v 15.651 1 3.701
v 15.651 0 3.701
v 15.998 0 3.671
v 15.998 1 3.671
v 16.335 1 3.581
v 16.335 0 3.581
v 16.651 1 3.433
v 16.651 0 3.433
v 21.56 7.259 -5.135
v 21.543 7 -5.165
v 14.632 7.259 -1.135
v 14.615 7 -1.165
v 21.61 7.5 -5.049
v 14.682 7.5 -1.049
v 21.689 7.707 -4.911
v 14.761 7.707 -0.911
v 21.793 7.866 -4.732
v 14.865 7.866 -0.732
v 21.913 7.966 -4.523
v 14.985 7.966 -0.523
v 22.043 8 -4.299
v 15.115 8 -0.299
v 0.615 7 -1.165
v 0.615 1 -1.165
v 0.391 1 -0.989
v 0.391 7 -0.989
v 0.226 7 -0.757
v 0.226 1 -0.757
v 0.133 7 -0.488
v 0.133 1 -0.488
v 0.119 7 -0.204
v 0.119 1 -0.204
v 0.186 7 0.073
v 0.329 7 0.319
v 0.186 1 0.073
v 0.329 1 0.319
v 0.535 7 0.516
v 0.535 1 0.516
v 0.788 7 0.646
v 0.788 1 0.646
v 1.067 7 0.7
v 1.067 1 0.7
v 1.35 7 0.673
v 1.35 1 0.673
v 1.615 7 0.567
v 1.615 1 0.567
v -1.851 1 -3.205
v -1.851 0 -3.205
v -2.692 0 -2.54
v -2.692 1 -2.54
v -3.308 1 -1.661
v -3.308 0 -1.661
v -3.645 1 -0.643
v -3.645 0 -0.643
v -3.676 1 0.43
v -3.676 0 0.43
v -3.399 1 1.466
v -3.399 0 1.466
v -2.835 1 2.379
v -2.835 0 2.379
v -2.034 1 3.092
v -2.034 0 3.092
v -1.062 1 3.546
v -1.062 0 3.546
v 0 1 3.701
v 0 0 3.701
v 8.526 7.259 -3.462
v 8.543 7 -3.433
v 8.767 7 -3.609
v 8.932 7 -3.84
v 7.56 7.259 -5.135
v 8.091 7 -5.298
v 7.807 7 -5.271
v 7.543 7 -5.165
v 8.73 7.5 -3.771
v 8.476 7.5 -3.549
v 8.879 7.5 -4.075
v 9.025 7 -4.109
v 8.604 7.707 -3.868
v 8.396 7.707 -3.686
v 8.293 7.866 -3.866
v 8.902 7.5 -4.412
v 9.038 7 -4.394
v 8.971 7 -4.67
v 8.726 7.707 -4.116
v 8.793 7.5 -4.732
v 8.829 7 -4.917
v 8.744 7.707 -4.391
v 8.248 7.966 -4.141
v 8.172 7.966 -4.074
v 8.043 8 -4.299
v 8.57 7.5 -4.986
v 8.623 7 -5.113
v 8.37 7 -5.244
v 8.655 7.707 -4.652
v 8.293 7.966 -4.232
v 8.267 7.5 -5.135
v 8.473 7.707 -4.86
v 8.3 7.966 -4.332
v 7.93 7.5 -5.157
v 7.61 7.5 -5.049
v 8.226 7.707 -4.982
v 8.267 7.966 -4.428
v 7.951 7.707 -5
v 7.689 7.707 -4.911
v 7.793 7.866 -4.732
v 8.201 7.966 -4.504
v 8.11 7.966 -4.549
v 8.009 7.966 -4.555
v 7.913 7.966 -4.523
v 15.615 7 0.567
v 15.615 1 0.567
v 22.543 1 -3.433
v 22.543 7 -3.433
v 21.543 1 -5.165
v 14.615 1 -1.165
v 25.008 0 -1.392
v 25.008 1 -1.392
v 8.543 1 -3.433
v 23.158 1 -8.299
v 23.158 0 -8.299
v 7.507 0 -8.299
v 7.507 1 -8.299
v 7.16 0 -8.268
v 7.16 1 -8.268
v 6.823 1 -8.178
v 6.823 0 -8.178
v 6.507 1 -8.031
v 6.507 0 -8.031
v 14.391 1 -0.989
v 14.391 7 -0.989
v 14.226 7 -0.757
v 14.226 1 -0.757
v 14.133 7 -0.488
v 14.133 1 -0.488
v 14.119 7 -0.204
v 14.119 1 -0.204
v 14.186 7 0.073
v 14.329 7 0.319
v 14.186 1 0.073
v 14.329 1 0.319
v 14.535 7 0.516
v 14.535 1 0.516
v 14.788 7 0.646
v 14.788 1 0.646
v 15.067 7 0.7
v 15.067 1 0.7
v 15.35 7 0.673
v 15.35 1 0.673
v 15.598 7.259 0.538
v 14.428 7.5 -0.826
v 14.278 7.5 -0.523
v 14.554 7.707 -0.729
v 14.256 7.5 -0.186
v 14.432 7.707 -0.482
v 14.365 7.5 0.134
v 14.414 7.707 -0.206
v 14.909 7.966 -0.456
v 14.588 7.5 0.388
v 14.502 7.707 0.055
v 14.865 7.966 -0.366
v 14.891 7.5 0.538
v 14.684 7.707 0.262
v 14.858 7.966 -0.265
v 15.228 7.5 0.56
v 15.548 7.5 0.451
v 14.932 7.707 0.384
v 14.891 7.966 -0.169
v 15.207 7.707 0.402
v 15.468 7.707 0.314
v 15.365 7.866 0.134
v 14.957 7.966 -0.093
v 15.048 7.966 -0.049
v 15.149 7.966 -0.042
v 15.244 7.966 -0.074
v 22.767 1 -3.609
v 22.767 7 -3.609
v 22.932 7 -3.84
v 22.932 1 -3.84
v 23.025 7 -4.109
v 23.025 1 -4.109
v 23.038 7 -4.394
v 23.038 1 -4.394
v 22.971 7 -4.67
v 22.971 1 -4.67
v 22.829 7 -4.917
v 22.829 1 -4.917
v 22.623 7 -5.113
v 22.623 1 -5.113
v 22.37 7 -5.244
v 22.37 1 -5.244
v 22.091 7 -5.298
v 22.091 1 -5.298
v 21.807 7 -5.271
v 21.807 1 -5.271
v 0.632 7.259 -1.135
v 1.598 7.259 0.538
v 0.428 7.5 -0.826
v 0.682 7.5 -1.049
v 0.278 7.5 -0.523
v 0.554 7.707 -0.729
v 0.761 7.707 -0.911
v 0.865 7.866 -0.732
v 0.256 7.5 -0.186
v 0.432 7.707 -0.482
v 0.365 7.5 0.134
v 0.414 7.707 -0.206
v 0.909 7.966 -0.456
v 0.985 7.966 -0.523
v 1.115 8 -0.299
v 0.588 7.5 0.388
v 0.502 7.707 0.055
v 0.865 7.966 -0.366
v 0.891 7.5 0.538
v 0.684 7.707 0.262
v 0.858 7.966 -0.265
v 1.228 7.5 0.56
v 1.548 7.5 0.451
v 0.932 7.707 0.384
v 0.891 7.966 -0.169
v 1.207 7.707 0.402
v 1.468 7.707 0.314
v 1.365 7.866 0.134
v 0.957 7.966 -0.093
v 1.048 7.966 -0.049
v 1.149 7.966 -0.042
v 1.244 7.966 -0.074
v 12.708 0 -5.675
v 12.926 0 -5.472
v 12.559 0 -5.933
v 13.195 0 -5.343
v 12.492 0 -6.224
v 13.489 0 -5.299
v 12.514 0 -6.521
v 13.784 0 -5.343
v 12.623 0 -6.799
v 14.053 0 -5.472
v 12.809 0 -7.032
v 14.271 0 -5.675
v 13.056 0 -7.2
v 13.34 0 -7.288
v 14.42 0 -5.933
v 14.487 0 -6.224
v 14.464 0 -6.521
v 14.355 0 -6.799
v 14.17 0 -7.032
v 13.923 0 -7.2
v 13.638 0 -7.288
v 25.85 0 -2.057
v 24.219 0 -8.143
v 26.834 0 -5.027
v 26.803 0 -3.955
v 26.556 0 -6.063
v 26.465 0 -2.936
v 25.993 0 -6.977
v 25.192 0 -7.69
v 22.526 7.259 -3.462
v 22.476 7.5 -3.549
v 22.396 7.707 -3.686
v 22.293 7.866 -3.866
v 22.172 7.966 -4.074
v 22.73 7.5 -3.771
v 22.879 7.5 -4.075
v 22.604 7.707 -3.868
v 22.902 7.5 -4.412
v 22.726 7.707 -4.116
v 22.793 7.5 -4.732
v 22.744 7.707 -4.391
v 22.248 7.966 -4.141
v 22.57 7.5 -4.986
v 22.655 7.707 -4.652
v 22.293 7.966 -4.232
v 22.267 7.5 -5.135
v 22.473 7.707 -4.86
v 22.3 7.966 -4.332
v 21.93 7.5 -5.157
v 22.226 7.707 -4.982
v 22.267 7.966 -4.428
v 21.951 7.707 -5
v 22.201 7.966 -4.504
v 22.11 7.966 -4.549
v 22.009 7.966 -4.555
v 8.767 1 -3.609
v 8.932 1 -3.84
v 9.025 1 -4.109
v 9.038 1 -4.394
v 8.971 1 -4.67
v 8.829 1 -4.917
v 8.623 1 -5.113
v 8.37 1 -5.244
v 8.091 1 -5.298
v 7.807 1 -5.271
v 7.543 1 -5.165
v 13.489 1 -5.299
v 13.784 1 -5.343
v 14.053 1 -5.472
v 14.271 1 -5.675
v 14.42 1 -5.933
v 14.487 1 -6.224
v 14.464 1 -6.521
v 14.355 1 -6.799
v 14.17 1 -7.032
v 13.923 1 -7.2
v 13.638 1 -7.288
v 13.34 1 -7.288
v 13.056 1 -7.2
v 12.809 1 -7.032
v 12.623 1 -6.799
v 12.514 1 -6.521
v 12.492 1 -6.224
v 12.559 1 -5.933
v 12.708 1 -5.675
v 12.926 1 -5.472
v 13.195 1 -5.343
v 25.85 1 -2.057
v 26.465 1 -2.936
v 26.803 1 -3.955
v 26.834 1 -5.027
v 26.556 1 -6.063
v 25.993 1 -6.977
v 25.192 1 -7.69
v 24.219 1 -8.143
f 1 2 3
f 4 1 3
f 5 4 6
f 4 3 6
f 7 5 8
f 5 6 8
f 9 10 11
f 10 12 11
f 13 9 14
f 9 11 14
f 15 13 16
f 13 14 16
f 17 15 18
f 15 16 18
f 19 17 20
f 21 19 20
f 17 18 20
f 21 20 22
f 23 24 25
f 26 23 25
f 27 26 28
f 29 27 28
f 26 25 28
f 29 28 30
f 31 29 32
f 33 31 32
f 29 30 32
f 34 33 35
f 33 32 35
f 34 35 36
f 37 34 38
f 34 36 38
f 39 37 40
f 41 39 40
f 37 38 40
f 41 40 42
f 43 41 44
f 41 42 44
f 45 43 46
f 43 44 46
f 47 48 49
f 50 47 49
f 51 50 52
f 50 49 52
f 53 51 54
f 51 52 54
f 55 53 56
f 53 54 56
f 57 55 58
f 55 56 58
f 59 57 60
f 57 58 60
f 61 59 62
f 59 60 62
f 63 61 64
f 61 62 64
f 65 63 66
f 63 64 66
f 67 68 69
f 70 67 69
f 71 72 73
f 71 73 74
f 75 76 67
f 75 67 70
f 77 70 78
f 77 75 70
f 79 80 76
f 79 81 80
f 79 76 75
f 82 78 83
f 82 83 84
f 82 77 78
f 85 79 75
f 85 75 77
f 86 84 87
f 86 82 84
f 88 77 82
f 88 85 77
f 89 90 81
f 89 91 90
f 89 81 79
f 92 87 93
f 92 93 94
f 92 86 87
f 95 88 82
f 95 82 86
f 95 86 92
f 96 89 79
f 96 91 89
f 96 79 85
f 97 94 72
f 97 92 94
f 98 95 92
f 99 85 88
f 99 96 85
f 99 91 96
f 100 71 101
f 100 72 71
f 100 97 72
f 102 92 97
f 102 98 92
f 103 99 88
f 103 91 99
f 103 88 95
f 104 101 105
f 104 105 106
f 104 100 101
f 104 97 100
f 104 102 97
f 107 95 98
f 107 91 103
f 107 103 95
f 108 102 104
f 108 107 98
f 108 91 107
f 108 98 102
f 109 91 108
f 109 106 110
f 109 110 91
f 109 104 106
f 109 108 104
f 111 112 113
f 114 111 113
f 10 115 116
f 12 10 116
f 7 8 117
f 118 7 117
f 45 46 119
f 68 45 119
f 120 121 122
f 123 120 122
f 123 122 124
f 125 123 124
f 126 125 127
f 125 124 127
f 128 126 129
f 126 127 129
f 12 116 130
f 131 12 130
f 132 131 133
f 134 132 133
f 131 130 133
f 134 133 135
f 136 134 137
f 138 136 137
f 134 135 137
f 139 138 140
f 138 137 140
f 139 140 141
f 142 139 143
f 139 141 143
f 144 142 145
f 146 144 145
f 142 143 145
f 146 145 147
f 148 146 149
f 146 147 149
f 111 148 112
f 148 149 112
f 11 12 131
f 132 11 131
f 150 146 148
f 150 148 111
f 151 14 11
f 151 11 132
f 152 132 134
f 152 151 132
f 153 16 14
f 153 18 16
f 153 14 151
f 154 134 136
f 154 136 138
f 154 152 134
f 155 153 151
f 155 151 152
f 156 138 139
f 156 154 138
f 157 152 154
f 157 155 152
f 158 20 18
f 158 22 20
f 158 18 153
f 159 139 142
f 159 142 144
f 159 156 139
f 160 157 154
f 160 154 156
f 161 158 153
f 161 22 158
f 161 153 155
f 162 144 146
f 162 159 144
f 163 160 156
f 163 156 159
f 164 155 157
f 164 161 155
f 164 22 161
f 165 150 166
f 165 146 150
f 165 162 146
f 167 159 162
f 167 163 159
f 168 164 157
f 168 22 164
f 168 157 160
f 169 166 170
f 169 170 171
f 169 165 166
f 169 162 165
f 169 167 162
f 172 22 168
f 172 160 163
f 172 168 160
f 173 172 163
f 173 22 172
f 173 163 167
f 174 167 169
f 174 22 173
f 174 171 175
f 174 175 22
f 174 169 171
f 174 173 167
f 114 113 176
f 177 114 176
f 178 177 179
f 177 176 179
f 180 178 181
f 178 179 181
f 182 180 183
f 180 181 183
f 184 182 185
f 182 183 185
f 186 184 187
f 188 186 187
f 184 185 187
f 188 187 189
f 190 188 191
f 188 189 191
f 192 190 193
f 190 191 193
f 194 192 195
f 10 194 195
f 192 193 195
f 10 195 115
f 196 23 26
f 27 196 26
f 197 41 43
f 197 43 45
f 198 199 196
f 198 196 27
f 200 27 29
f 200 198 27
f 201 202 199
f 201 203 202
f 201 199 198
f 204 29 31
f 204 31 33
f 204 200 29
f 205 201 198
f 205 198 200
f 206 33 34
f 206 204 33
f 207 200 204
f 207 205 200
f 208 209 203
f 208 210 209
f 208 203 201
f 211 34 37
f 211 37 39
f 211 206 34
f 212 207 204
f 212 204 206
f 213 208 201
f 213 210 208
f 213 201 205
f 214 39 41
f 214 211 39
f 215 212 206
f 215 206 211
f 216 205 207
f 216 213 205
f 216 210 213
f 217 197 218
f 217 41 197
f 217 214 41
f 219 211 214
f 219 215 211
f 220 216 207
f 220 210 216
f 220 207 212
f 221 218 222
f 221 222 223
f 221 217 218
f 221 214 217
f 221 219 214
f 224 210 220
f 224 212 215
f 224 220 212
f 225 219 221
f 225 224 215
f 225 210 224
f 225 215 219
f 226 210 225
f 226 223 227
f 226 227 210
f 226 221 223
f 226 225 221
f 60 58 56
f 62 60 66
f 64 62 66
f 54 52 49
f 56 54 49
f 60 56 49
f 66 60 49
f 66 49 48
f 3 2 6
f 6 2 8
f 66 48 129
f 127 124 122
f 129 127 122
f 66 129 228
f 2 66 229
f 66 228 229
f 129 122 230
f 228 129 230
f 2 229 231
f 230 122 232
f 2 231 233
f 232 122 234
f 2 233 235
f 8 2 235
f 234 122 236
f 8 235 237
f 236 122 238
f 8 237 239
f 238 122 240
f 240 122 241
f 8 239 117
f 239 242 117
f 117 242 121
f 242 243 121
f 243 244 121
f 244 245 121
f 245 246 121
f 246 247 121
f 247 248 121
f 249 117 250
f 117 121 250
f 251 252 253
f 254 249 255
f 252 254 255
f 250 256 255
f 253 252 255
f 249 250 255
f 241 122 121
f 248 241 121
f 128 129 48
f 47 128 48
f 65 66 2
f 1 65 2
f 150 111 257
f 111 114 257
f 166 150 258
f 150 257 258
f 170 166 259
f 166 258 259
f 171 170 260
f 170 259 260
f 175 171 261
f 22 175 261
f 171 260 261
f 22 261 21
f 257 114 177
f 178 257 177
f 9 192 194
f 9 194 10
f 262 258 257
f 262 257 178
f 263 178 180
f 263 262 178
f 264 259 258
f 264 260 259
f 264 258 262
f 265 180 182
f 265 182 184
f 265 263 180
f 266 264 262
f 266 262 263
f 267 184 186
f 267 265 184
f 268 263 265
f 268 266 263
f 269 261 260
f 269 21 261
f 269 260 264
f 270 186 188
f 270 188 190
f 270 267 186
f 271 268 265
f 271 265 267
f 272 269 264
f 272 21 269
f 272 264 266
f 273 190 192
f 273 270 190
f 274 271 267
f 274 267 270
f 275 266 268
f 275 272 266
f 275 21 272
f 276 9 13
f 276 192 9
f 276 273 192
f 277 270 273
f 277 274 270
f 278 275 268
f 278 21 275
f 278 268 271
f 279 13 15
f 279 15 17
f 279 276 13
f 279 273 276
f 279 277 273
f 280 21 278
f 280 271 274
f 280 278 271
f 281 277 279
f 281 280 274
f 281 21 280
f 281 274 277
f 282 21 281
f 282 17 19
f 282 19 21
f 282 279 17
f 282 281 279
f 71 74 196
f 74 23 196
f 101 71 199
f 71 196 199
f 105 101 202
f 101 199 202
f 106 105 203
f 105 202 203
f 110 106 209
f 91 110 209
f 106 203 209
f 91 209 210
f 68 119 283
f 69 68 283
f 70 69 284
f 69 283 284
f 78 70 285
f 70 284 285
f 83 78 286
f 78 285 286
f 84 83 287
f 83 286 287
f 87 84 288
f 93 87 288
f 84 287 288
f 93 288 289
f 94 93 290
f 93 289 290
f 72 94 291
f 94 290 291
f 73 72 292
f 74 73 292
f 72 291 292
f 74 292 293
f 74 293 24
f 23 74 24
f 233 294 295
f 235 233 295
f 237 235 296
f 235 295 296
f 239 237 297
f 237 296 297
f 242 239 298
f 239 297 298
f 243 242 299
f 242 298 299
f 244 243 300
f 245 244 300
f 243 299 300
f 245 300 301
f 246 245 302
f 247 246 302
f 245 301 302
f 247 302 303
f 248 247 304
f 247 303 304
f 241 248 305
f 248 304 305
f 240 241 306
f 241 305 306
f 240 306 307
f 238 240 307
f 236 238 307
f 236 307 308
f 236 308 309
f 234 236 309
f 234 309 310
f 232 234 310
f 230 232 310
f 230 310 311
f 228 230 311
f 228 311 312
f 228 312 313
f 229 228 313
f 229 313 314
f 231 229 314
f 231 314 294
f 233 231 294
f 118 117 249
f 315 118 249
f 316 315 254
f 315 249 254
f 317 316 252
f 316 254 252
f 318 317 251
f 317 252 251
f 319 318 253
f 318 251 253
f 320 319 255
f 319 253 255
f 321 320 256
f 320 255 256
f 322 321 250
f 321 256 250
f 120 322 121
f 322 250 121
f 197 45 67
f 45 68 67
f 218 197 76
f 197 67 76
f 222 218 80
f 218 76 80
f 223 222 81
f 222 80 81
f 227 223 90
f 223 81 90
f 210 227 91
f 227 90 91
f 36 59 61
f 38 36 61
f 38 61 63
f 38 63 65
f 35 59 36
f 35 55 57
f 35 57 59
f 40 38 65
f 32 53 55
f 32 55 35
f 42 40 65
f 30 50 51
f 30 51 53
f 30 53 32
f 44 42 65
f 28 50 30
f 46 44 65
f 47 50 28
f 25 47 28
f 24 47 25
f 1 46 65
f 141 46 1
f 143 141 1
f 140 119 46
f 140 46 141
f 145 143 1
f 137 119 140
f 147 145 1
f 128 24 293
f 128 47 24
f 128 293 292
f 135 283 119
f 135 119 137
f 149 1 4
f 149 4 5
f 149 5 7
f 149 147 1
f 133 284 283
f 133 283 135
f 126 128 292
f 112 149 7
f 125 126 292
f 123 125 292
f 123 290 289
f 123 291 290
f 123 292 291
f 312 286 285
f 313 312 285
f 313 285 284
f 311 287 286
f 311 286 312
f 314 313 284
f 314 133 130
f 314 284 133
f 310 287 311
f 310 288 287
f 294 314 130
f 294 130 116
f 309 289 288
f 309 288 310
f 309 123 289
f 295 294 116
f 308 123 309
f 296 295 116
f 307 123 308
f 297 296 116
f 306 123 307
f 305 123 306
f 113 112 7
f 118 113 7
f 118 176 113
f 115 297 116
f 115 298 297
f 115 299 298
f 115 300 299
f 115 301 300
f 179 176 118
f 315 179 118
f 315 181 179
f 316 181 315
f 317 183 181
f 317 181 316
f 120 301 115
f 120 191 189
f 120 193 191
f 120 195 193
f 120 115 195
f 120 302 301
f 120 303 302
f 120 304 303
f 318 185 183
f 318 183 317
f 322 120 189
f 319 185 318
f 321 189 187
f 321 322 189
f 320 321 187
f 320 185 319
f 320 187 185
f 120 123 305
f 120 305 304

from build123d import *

# Parameters (mm, degrees)
BOSS_EXTRUDE1_DEPTH = 1
BOSS_EXTRUDE2_DEPTH = 7
LPATTERN1_COUNT     = 2
LPATTERN1_PITCH     = 14
FILLET3_R           = 1
SKETCH3_R           = 1
CUT_EXTRUDE1_DEPTH  = 29.970188425


with BuildPart() as part:
    # Sketch1 → Boss-Extrude1 (new body)
    with BuildSketch(Plane(origin=(0, 0, 0), x_dir=(1, 0, 0), z_dir=(0, 1, 0))):
        with BuildLine():
            Line((0, -3.701311317), (15.650619727, -3.701311317))
            ThreePointArc((15.650619727, -3.701311317), (16.168257817, -3.633162969), (16.650619727, -3.433362124))
            Line((16.650619727, -3.433362124), (25.008301572, 1.391947739))
            ThreePointArc((25.008301572, 1.391947739), (26.732838106, 5.555347227), (23.157645914, 8.298688683))
            Line((23.157645914, 8.298688683), (7.507026187, 8.298688683))
            ThreePointArc((7.507026187, 8.298688683), (6.989388097, 8.230540336), (6.507026187, 8.030739491))
            Line((6.507026187, 8.030739491), (-1.850655658, 3.205429628))
            ThreePointArc((-1.850655658, 3.205429628), (-3.575192192, -0.957969861), (0, -3.701311317))
        make_face()
    extrude(amount=BOSS_EXTRUDE1_DEPTH)

    # Sketch2 → Boss-Extrude2 (add)
    with BuildSketch(Plane(origin=(0, 1, 0), x_dir=(1, 0, 0), z_dir=(0, 1, 0))):
        with BuildLine():
            Line((21.542924572, 5.164714087), (14.614721342, 1.164714087))
            ThreePointArc((14.614721342, 1.164714087), (14.248695938, -0.201311317), (15.614721342, -0.567336721))
            Line((15.614721342, -0.567336721), (22.542924572, 3.432663279))
            ThreePointArc((22.542924572, 3.432663279), (22.908949976, 4.798688683), (21.542924572, 5.164714087))
        make_face()
    boss_extrude2 = extrude(amount=BOSS_EXTRUDE2_DEPTH)

    # LPattern1: Boss-Extrude2 ×2
    with Locations(*[(-i * LPATTERN1_PITCH, 0, 0) for i in range(1, LPATTERN1_COUNT)]):
        add(boss_extrude2)

    # Fillet3
    fillet3_edges = [part.edges().sort_by_distance(p)[0] for p in [
        (14.248695938, 8, 0.201311317),
        (18.078822957, 8, -3.164714087),
        (22.908949976, 8, -4.798688683),
        (19.078822957, 8, -1.432663279),
        (0.248695938, 8, 0.201311317),
        (4.078822957, 8, -3.164714087),
        (8.908949976, 8, -4.798688683),
        (5.078822957, 8, -1.432663279),
    ]]
    fillet(fillet3_edges, radius=FILLET3_R)

    # Sketch3 → Cut-Extrude1 (cut, through all)
    with BuildSketch(Plane(origin=(0, 1, 0), x_dir=(1, 0, 0), z_dir=(0, 1, 0))):
        with Locations((13.489388097, 6.298688683)):
            Circle(SKETCH3_R)
    extrude(amount=-CUT_EXTRUDE1_DEPTH, mode=Mode.SUBTRACT)


solid = part.part
